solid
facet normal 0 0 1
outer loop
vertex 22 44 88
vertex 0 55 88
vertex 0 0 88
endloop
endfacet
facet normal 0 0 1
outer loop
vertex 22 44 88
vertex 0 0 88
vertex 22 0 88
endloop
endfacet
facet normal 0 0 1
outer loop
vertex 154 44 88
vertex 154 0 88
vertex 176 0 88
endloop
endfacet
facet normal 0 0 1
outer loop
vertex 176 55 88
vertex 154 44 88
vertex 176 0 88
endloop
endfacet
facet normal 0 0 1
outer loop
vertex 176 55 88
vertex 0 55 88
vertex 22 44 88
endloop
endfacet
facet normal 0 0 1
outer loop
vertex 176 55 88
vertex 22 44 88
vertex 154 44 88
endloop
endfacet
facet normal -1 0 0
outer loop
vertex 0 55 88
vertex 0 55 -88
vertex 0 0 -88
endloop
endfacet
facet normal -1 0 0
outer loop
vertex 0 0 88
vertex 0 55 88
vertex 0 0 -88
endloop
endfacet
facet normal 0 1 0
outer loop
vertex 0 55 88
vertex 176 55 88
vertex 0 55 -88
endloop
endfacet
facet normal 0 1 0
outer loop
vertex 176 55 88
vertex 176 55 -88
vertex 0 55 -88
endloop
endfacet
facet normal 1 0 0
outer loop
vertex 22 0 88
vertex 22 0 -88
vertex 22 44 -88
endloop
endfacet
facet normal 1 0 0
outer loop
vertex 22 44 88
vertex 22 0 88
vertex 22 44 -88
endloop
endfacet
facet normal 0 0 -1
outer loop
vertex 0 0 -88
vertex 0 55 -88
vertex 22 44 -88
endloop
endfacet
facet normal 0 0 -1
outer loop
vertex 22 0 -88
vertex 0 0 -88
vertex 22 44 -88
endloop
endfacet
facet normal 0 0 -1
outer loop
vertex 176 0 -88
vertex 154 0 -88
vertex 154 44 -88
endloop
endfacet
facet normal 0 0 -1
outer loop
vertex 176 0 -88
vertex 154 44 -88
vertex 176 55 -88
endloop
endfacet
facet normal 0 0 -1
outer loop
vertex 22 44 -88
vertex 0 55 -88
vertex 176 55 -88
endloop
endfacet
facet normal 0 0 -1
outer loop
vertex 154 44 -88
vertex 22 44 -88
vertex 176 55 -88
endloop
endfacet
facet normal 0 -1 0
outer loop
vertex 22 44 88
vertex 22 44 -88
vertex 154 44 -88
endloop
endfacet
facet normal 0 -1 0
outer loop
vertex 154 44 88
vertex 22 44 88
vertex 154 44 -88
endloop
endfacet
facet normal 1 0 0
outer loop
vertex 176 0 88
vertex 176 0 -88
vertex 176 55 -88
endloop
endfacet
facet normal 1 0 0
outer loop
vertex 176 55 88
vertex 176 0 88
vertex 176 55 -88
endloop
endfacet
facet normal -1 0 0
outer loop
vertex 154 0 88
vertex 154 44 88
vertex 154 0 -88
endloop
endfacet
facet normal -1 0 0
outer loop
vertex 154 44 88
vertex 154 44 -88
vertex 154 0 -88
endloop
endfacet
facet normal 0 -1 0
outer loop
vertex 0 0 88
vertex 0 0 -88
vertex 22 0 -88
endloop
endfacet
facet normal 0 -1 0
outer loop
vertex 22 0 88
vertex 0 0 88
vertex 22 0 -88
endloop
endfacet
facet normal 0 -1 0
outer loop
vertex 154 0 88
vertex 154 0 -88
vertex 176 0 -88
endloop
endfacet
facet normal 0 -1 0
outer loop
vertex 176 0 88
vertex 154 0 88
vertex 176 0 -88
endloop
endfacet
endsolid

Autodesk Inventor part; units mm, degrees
ref_plane "YZ Plane" through (0, 0, 0) normal (1, 0, 0) x (0, 1, 0)
ref_plane "XZ Plane" through (0, 0, 0) normal (0, 1, 0) x (-1, 0, 0)
ref_plane "XY Plane" through (0, 0, 0) normal (0, 0, 1) x (1, 0, 0)
sketch "草圖2" plane through (0, 0, 0) normal (0, 0, 1) x (1, 0, 0)
  line L0 (0, 55) -> (0, 0)
  line L1 (0, 0) -> (22, 0)
  line L2 (22, 0) -> (22, 44)
  line L3 (22, 44) -> (154, 44)
  line L4 (154, 44) -> (154, 0)
  line L5 (154, 0) -> (176, 0)
  line L6 (176, 0) -> (176, 55)
  line L7 (176, 55) -> (0, 55)
  dimension "d11" = 22
  dimension "d12" = 11
  dimension "d14" = 176
  dimension "d17" = 44
extrude "擠出2" add sketch "草圖2" along normal mid plane 176
equation "\"d11\" = leg_length"
equation "\"d12\" = thickness"
equation "\"d14\" = width"
equation "\"d17\" = height"
equation "\"d15\" = length"
equation "\"width\" = 80 * ratio"
equation "\"height\" = 20 * ratio"
equation "\"length\" = width"
equation "\"leg_length\" = ratio"
equation "\"ratio\" = 2.2"
equation "\"thickness\" = 5 * ratio"
properties part number "bridge_rect_final"
